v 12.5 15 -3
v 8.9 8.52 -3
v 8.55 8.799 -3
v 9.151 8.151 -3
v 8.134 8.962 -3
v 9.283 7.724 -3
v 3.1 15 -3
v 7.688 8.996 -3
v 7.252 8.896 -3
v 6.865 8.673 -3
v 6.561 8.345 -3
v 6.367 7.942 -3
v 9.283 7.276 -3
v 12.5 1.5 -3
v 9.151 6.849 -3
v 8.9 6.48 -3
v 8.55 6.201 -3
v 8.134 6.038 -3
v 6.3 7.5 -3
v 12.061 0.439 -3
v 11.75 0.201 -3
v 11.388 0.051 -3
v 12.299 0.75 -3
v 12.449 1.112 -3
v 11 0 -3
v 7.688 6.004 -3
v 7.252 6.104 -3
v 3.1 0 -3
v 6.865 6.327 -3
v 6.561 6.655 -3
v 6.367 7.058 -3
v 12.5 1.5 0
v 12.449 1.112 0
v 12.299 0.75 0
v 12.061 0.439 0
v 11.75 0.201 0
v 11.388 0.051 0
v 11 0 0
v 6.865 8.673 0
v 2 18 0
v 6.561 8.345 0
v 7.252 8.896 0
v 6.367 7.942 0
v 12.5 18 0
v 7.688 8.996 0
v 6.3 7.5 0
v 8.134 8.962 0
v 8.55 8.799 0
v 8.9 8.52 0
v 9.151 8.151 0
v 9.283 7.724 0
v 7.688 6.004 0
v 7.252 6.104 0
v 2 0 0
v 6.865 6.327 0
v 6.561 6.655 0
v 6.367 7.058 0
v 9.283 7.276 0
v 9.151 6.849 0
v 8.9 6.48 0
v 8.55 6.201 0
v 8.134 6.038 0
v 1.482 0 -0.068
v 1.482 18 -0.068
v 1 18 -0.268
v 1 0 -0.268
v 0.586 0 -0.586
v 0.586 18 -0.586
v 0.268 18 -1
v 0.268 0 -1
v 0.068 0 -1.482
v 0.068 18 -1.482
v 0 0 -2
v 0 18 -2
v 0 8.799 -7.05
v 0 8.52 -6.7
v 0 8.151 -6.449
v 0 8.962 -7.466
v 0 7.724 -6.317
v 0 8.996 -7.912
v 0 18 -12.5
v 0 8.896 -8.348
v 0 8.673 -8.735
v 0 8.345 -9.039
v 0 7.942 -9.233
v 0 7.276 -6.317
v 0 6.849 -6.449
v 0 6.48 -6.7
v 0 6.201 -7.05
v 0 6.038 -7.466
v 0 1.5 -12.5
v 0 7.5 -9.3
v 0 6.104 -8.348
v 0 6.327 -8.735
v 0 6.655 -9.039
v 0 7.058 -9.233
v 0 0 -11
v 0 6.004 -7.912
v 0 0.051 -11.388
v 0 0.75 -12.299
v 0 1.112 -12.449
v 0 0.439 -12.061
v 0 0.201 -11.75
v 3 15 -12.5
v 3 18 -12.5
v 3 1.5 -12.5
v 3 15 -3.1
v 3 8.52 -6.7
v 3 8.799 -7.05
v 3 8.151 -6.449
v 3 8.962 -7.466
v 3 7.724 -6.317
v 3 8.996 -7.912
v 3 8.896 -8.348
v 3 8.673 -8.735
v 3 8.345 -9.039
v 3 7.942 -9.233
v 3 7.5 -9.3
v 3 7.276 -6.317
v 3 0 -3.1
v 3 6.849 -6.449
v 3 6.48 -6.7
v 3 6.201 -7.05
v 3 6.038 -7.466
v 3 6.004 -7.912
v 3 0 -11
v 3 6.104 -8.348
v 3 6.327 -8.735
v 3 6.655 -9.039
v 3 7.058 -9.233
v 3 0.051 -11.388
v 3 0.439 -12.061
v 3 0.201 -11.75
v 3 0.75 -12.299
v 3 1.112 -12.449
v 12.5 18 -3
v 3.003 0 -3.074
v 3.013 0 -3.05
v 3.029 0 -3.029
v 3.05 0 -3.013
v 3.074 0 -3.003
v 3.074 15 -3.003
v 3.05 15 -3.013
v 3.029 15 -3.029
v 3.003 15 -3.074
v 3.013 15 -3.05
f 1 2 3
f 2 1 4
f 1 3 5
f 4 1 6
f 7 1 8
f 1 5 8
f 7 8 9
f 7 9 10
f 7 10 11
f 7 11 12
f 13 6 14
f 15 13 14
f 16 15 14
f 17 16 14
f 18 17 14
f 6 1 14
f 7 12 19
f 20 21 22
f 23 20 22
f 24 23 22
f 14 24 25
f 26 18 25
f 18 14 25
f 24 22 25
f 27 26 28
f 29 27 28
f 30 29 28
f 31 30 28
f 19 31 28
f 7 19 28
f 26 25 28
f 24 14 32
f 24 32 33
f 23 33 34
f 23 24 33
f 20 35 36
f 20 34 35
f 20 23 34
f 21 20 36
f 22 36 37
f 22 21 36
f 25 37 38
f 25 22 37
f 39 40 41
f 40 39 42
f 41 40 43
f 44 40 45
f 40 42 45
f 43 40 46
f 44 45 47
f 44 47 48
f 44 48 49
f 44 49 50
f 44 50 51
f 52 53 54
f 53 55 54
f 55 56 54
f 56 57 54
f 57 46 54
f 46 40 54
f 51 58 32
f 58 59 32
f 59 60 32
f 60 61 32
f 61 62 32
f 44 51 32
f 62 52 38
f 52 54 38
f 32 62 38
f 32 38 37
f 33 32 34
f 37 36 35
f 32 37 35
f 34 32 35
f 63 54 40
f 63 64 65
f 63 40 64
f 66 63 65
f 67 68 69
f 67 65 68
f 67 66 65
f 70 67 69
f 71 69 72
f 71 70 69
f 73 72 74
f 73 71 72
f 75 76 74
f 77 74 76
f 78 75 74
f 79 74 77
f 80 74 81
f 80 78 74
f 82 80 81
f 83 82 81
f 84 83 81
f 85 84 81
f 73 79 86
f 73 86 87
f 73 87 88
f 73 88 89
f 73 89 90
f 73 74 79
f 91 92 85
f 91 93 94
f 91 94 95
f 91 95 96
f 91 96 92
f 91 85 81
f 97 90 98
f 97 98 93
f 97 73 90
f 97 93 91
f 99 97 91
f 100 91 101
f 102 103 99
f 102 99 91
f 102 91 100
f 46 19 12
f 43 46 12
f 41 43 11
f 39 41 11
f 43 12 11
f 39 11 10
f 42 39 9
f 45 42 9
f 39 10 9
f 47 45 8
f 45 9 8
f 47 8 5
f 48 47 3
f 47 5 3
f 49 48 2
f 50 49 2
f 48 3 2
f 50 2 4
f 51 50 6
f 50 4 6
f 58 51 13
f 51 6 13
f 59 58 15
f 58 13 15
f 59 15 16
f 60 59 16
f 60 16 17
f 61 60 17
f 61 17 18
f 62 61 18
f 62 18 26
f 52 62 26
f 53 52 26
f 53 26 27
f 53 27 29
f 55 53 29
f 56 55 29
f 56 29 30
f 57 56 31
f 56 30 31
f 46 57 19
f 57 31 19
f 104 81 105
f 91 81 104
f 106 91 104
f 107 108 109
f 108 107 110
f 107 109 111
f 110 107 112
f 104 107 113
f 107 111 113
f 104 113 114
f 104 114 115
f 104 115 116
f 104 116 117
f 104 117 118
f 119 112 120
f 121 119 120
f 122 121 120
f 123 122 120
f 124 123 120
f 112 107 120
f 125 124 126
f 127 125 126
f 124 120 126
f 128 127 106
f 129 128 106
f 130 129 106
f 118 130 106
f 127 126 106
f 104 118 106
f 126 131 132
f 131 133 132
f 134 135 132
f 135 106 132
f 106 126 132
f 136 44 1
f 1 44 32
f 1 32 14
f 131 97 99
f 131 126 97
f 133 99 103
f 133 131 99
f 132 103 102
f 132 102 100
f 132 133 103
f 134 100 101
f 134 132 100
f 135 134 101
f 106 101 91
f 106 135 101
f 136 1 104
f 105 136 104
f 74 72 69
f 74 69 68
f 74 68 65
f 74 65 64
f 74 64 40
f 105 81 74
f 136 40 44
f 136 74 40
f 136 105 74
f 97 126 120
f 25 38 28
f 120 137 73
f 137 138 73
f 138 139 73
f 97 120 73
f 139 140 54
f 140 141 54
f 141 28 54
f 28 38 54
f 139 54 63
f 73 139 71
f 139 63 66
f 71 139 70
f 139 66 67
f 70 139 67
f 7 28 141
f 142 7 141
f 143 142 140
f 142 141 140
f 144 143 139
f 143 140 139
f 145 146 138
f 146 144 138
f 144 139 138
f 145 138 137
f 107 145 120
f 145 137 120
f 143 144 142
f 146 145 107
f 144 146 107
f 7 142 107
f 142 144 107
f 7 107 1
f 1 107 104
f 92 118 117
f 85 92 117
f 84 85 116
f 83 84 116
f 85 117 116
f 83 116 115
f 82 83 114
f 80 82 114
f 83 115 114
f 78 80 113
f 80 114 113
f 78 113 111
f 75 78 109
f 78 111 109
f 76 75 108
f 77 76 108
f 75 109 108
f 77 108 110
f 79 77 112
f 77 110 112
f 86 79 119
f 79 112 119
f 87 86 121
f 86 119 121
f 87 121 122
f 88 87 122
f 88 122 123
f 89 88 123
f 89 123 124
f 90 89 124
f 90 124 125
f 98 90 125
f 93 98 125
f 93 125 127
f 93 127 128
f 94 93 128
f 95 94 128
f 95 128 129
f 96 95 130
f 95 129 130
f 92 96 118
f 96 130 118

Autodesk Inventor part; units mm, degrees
ref_plane "YZ Plane" through (0, 0, 0) normal (1, 0, 0) x (0, 1, 0)
ref_plane "XZ Plane" through (0, 0, 0) normal (0, 1, 0) x (-1, 0, 0)
ref_plane "XY Plane" through (0, 0, 0) normal (0, 0, 1) x (1, 0, 0)
sketch "Sketch1" plane through (0, 0, 0) normal (0, 1, 0) x (-1, 0, 0)
  line L0 (0, -2) -> (0, -12.5)
  line L1 (0, -12.5) -> (-3, -12.5)
  line L2 (-2, 0) -> (-12.5, 0)
  line L3 (-12.5, 0) -> (-12.5, -3)
  line L4 (-12.5, -3) -> (-3.1, -3)
  line L5 (-3, -3.1) -> (-3, -12.5)
  line L6 (0, 0) -> (-12.1249, -12.1249) construction
  arc A0 (-3, -3.1) -> (-3.1, -3) centre (-3.1, -3.1) ccw
  arc A1 (0, -2) -> (-2, 0) centre (-2, -2) ccw
  line L7 (-15.0828, 0) -> (2.9971, 0) projected
  point P0 (-3, -3)
  dimension "d4" = 3
  dimension "d8" = 0.1
  dimension "d9" = 2
  dimension "d16" = 90
  dimension "d17" = 12.5
extrude "Extrusion1" add sketch "Sketch1" along normal blind 15
sketch "Sketch2" plane through (0, 15, 0) normal (0, 1, 0) x (1, 0, 0)
  line L0 (0, 12.5) -> (0, 2) projected
  line L1 (2, 0) -> (12.5, 0) projected
  line L2 (12.5, 0) -> (12.5, 3) projected
  line L3 (12.5, 3) -> (3.1, 3) projected
  line L4 (3, 3.1) -> (3, 12.5) projected
  line L5 (3, 12.5) -> (0, 12.5) projected
  line L6 (12.5, 3) -> (3, 12.5)
  arc A0 (0, 2) -> (2, 0) centre (2, 2) ccw projected
  arc A1 (3, 3.1) -> (3.1, 3) centre (3.1, 3.1) ccw projected
  point P0 (0, 0)
extrude "Extrusion2" add sketch "Sketch2" along normal blind 3
sketch "Sketch3" plane through (12.5, 0, -3) normal (0, 0, -1) x (-1, 0, 0)
  line L0 (0, 0) -> (9.4, 0) projected
  line L1 (0, 0) -> (0, 15) projected
  circle A0 centre (4.7, 7.5) radius 1.5
  line L2 (9.4, 0) -> (9.4, 15) projected
  line L3 (0, 15) -> (9.4, 15) projected
  point P0 (12.5, 0)
  point P1 (4.7, 0)
  point P2 (0, 7.5)
  dimension "d5" = 3
extrude "Extrusion3" cut sketch "Sketch3" against normal through all contours A0
sketch "Sketch5" plane through (3, 0, -12.5) normal (1, 0, 0) x (0, 0, -1)
  circle A0 centre (-4.7, 7.5) radius 1.5
  line L0 (-9.4, 0) -> (0, 0) projected
  line L1 (0, 0) -> (0, 15) projected
  line L2 (-9.4, 15) -> (0, 15) projected
  line L3 (-9.4, 0) -> (-9.4, 15) projected
  point P0 (-12.5, 0)
  point P1 (0, 7.5)
  dimension "d12" = 3
  dimension "d18" = 4.7
extrude "Extrusion4" cut sketch "Sketch5" against normal through all contours A0
fillet "Fillet1" radius 1.5 2 edges at (1.5, 0, -12.5) (12.5, 0, -1.5)
properties part number "EE_adapter_forOld"
